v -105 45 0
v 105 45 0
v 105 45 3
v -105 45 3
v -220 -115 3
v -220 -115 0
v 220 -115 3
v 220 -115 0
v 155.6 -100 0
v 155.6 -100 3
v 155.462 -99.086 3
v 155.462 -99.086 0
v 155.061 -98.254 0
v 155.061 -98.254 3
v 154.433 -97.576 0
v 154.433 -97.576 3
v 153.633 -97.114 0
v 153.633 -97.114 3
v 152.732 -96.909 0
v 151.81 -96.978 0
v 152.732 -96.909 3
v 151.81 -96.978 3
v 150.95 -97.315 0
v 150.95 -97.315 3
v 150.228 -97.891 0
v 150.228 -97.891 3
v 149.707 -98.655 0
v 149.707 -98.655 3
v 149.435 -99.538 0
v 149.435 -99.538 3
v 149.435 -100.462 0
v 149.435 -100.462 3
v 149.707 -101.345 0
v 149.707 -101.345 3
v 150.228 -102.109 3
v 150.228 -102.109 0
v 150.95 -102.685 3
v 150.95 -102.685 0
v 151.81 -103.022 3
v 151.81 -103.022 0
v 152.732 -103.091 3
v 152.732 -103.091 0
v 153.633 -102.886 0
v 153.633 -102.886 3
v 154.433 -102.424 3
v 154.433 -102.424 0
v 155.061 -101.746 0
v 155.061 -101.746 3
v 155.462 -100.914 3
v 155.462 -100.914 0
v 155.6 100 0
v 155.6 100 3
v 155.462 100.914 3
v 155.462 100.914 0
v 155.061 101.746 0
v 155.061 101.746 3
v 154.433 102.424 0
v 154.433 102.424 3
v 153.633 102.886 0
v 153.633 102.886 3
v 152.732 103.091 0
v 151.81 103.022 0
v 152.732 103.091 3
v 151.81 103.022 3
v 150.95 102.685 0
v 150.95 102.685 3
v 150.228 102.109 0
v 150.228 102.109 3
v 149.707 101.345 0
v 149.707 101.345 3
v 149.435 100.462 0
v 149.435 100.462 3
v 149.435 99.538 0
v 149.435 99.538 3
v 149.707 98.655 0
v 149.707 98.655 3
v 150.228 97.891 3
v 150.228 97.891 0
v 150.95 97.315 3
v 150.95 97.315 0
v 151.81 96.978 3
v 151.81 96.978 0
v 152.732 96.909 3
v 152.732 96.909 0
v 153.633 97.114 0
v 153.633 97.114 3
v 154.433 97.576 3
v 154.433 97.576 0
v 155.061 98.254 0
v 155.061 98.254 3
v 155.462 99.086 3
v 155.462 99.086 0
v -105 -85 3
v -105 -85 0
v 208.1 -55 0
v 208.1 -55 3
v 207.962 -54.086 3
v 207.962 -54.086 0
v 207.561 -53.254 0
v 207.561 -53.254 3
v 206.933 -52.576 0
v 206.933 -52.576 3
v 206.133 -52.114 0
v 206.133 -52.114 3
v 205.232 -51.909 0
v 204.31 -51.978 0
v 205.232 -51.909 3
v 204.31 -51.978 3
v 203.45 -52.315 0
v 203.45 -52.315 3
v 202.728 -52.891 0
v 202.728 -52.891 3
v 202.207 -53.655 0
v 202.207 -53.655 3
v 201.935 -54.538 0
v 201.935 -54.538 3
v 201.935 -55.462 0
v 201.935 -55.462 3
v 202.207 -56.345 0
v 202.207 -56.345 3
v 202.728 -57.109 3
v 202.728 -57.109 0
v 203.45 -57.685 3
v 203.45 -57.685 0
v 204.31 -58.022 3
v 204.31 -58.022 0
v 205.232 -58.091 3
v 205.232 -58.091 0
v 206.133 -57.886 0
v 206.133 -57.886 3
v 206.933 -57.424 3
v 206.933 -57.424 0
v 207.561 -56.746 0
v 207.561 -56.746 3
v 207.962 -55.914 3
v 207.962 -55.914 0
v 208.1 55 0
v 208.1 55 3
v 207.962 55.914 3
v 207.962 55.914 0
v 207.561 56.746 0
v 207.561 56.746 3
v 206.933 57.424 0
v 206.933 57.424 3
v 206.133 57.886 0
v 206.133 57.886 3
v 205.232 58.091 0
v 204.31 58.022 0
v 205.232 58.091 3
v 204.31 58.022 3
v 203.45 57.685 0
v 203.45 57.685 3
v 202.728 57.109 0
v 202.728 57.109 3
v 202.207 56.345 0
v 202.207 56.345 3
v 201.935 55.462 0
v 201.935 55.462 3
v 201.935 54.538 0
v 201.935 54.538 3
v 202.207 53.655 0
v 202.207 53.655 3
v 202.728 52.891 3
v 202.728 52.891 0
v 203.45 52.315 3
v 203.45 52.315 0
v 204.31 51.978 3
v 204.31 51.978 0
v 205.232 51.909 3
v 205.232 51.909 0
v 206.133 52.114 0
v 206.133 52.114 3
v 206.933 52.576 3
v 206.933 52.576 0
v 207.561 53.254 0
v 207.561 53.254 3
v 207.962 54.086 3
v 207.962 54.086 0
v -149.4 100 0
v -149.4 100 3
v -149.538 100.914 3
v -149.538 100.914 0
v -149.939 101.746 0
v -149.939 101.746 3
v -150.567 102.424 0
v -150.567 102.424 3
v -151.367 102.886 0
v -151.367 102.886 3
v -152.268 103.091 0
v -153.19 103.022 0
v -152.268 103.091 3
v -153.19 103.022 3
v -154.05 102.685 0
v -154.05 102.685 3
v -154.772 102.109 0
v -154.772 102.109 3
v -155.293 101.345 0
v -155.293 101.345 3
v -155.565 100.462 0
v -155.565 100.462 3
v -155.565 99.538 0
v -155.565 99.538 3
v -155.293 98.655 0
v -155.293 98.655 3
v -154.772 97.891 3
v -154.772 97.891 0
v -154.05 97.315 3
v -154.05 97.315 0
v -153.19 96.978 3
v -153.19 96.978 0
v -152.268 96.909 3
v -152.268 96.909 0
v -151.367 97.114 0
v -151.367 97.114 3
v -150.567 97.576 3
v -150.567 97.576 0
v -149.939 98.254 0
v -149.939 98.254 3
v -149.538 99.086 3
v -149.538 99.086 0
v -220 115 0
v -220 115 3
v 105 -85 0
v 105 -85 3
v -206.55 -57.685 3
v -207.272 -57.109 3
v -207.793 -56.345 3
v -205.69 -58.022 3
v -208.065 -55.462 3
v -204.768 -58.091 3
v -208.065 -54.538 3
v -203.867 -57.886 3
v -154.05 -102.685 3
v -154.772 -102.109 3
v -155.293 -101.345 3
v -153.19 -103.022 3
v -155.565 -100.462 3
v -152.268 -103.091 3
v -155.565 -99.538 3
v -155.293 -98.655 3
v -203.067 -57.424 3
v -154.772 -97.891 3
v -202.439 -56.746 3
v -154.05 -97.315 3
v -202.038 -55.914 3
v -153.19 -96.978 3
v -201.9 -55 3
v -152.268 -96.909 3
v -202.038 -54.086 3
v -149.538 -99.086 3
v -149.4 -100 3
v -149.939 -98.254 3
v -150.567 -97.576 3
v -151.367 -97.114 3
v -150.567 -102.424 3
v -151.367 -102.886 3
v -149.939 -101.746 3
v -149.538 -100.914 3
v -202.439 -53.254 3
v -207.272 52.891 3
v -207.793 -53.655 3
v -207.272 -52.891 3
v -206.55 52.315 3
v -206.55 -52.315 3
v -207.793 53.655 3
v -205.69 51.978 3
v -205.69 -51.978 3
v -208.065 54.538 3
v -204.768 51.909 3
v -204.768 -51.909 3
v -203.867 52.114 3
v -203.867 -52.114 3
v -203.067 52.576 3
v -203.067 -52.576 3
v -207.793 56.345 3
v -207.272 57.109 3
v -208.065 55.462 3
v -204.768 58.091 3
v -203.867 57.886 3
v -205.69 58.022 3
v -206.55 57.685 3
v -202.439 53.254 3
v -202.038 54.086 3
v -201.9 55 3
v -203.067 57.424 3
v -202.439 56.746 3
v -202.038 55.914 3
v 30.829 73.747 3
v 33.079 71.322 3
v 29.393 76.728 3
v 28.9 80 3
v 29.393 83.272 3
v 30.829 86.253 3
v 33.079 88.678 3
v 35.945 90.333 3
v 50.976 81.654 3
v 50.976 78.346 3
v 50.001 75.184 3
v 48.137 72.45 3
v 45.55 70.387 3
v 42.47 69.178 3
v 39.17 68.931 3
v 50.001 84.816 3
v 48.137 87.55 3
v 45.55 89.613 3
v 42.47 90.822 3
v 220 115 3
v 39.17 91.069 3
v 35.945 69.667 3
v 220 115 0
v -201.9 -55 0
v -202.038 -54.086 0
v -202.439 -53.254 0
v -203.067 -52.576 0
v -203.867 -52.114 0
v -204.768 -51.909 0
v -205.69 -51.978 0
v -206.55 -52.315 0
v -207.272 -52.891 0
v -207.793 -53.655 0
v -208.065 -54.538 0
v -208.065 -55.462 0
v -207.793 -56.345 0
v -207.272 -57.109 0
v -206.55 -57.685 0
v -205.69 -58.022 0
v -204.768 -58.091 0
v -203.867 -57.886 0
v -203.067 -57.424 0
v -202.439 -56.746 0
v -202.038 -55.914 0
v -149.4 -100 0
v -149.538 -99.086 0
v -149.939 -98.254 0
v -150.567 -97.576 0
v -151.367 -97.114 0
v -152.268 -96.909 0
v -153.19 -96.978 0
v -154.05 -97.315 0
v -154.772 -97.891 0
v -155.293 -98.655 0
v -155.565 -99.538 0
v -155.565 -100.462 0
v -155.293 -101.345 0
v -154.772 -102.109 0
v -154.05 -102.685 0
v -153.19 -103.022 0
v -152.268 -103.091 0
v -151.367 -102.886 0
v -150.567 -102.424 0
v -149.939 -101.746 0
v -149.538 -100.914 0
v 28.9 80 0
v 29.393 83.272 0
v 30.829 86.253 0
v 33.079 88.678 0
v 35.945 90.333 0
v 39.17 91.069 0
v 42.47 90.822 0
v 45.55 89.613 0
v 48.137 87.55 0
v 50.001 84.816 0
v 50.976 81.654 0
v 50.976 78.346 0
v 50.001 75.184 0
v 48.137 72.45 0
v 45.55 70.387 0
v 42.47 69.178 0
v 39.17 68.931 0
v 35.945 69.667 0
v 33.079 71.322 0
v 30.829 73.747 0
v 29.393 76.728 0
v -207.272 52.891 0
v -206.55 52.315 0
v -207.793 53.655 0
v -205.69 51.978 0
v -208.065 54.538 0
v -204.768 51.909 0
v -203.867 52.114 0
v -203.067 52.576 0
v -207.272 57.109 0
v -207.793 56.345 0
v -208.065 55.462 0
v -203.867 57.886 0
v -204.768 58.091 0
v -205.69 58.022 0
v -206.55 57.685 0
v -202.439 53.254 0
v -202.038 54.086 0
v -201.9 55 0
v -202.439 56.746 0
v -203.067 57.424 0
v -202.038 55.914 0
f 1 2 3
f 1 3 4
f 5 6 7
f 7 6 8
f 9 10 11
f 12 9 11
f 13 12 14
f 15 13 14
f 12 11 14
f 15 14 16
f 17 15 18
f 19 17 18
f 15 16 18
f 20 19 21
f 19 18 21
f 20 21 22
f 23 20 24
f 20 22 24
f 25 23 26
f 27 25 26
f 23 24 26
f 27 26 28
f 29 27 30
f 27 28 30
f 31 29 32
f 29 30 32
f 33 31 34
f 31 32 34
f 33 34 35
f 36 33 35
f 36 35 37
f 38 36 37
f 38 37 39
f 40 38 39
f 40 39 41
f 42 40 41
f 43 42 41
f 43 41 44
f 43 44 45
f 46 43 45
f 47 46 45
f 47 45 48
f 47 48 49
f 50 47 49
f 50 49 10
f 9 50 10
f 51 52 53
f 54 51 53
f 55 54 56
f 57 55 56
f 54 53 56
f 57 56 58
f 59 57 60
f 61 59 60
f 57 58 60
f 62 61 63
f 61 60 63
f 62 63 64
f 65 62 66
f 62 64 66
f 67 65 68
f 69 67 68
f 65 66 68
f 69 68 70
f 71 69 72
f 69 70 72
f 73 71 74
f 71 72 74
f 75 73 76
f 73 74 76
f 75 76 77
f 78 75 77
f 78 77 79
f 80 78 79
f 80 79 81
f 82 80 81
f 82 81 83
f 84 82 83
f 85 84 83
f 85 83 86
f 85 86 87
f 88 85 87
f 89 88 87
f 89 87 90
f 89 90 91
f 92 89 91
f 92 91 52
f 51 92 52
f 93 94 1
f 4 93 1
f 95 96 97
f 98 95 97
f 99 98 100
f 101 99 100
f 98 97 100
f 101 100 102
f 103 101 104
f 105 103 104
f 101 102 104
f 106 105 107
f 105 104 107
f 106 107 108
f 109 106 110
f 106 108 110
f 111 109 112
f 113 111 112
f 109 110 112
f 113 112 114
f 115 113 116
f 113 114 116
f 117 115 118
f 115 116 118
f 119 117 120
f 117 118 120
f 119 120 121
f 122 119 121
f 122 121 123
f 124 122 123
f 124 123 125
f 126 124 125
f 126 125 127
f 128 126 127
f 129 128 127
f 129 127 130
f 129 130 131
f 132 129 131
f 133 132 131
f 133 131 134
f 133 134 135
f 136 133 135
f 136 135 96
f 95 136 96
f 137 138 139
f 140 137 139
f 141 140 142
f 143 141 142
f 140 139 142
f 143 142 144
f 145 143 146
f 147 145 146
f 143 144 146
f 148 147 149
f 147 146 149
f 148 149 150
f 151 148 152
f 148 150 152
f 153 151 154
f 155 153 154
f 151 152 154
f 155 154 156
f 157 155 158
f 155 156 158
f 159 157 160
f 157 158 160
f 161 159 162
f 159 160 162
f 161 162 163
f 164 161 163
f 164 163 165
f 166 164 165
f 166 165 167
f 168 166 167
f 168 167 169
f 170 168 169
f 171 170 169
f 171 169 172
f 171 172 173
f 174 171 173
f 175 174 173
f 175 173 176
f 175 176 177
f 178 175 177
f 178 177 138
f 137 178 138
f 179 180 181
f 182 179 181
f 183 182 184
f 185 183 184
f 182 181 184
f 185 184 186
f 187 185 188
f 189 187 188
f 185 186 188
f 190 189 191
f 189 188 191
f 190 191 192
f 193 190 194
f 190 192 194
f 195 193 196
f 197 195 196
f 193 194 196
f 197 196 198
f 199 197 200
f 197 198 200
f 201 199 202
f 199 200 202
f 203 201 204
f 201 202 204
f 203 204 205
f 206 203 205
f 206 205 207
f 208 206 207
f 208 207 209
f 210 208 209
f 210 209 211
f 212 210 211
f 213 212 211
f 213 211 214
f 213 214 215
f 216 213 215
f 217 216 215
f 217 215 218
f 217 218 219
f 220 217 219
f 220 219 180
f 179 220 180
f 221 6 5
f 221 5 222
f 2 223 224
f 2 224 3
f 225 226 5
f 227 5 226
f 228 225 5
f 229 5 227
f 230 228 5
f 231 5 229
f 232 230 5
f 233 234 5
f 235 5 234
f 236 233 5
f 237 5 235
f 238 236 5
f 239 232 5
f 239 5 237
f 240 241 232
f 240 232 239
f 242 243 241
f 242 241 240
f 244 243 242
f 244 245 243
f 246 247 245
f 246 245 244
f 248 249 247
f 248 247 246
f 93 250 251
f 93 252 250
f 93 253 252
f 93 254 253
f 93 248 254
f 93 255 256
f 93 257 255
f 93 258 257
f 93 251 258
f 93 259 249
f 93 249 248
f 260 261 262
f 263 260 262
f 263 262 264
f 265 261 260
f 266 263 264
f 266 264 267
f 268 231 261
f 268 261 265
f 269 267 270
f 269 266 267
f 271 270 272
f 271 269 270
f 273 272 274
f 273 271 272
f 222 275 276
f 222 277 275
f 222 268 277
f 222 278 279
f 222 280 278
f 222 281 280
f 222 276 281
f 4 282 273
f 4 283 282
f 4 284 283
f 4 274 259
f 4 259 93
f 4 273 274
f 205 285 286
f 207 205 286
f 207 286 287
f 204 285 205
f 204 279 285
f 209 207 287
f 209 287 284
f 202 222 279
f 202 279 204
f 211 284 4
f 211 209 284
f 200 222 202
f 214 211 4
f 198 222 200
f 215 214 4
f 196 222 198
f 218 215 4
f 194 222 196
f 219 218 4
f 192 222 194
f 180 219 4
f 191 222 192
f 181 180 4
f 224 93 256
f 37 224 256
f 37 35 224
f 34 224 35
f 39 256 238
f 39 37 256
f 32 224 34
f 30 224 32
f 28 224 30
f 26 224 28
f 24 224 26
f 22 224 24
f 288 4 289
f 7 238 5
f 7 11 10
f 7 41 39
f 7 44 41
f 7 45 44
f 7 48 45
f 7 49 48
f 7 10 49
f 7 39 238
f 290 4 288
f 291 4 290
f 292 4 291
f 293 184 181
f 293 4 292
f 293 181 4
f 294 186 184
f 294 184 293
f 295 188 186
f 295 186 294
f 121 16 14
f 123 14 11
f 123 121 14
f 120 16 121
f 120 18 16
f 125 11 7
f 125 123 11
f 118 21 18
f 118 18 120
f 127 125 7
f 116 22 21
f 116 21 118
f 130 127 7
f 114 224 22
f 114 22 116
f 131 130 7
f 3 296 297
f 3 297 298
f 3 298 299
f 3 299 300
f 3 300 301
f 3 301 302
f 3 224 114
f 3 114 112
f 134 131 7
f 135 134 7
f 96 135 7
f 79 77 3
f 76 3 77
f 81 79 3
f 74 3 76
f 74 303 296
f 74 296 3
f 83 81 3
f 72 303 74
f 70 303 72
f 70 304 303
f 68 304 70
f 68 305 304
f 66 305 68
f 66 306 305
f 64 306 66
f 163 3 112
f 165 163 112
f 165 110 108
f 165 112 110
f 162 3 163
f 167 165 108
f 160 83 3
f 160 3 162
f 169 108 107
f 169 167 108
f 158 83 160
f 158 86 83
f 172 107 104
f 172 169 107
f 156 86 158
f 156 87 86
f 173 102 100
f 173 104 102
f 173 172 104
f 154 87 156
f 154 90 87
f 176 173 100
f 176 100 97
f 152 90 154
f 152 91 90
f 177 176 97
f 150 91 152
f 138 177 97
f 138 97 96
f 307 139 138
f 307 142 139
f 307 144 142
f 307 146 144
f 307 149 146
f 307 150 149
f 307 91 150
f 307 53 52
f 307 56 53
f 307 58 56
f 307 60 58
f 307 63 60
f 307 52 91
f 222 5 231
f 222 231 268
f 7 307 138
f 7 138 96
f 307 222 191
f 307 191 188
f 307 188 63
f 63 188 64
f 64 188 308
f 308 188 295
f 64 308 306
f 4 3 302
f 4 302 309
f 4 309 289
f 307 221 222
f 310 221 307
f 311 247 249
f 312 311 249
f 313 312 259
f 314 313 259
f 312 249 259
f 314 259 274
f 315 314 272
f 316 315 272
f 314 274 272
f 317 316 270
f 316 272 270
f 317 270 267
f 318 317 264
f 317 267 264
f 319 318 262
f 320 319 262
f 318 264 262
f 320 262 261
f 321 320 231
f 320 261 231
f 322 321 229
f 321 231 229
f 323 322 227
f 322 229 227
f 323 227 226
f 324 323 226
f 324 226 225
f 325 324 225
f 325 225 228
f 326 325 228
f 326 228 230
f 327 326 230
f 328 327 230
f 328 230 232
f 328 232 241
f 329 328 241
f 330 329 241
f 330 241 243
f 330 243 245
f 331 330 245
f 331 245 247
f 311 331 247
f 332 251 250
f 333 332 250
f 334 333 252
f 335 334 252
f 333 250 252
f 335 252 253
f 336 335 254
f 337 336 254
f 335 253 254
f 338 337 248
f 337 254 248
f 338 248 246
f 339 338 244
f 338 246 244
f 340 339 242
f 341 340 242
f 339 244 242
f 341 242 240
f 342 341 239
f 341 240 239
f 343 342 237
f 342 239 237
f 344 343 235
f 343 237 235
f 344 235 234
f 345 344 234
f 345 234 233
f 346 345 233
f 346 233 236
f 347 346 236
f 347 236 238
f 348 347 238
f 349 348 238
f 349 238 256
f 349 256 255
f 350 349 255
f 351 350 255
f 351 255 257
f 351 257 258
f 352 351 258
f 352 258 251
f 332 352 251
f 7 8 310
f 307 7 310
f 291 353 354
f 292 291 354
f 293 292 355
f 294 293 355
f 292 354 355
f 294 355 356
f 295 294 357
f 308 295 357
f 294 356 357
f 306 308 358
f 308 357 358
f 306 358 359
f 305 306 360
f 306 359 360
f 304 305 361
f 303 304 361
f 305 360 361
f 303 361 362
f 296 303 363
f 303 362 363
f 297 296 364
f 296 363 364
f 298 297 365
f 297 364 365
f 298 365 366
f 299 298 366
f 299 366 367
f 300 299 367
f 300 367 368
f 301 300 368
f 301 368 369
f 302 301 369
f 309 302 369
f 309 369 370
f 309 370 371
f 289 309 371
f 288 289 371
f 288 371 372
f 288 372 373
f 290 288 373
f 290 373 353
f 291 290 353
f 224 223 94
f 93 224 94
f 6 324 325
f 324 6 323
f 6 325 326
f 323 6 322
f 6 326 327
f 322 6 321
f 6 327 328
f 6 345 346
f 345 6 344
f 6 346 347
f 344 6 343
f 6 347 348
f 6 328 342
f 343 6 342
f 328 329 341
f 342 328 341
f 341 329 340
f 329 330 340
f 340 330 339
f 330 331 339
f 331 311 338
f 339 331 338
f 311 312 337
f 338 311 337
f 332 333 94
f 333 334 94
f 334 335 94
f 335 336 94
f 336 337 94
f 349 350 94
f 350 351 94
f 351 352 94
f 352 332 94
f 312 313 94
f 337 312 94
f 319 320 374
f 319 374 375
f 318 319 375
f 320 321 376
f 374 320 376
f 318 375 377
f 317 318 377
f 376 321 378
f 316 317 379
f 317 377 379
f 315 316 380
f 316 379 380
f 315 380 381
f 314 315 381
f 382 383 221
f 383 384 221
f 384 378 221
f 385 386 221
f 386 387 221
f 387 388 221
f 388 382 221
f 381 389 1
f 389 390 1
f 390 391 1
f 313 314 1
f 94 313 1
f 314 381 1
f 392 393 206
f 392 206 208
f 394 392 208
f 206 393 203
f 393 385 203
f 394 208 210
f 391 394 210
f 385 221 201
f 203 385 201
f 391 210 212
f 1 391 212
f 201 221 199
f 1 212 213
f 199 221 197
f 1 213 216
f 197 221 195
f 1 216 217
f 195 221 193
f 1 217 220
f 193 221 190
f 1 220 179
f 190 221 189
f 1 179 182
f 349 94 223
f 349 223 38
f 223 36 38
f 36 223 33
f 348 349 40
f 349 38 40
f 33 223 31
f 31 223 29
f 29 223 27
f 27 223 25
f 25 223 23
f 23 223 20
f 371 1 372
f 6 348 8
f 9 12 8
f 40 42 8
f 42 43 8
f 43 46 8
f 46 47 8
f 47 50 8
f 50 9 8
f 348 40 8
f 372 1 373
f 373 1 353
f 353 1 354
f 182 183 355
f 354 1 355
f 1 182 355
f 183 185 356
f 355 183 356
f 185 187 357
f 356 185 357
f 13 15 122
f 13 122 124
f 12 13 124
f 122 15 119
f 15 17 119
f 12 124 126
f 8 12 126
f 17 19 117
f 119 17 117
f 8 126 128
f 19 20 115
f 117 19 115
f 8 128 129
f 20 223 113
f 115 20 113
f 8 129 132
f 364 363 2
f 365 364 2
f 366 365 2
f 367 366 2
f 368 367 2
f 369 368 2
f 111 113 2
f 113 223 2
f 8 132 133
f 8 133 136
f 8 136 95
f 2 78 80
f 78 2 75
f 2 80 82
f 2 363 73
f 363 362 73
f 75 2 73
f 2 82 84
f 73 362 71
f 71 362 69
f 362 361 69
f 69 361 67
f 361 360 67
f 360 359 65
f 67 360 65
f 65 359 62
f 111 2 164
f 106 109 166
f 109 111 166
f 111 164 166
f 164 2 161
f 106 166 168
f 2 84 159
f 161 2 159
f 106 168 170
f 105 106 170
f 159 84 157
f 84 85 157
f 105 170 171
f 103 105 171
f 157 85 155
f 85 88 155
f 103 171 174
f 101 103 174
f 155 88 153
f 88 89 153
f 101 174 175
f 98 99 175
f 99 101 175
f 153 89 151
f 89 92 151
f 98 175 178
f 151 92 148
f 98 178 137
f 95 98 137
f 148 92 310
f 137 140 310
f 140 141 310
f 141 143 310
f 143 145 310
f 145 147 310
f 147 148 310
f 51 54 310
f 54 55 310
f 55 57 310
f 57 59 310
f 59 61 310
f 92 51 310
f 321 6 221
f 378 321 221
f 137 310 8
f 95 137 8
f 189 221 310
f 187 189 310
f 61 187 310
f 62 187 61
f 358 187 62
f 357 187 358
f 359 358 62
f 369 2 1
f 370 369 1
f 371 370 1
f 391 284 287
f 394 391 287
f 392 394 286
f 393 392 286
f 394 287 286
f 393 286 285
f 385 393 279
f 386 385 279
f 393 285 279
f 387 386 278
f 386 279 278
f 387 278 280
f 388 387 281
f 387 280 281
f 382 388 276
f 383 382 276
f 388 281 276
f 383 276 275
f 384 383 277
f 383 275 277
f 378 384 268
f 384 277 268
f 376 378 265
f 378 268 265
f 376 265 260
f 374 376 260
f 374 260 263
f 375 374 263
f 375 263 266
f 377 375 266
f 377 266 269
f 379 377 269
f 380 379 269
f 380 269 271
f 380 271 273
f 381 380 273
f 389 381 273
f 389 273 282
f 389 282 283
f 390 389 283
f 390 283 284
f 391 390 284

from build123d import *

# Parameters (mm, degrees)
CROQUIS1_W              = 440
CROQUIS1_H              = 230
SALIENTE_EXTRUIR1_DEPTH = 3
CROQUIS2_R              = 3.1
CORTAR_EXTRUIR1_DEPTH   = 4
CROQUIS3_W              = 210
CROQUIS3_H              = 130
CORTAR_EXTRUIR2_DEPTH   = 4
CROQUIS4_R              = 11.1
CORTAR_EXTRUIR3_DEPTH   = 4


with BuildPart() as part:
    # Croquis1 → Saliente-Extruir1 (new body)
    with BuildSketch(Plane.XY):
        Rectangle(CROQUIS1_W, CROQUIS1_H)
    extrude(amount=SALIENTE_EXTRUIR1_DEPTH)

    # Croquis2 → Cortar-Extruir1 (cut, through all)
    with BuildSketch(Plane.XY.offset(3)):
        with Locations((-205, 55)):
            Circle(CROQUIS2_R)
        with Locations((-152.5, 100)):
            Circle(CROQUIS2_R)
        with Locations((152.5, 100)):
            Circle(CROQUIS2_R)
        with Locations((-205, -55)):
            Circle(CROQUIS2_R)
        with Locations((205, -55)):
            Circle(CROQUIS2_R)
        with Locations((205, 55)):
            Circle(CROQUIS2_R)
        with Locations((152.5, -100)):
            Circle(CROQUIS2_R)
        with Locations((-152.5, -100)):
            Circle(CROQUIS2_R)
    extrude(amount=-CORTAR_EXTRUIR1_DEPTH, mode=Mode.SUBTRACT)

    # Croquis3 → Cortar-Extruir2 (cut, through all)
    with BuildSketch(Plane(origin=(0, 0, 0), x_dir=(-1, 0, 0), z_dir=(0, 0, -1))):
        with Locations((0, -20)):
            Rectangle(CROQUIS3_W, CROQUIS3_H)
    extrude(amount=-CORTAR_EXTRUIR2_DEPTH, mode=Mode.SUBTRACT)

    # Croquis4 → Cortar-Extruir3 (cut, through all)
    with BuildSketch(Plane(origin=(0, 0, 0), x_dir=(-1, 0, 0), z_dir=(0, 0, -1))):
        with Locations((-40, 80)):
            Circle(CROQUIS4_R)
    extrude(amount=-CORTAR_EXTRUIR3_DEPTH, mode=Mode.SUBTRACT)


solid = part.part
